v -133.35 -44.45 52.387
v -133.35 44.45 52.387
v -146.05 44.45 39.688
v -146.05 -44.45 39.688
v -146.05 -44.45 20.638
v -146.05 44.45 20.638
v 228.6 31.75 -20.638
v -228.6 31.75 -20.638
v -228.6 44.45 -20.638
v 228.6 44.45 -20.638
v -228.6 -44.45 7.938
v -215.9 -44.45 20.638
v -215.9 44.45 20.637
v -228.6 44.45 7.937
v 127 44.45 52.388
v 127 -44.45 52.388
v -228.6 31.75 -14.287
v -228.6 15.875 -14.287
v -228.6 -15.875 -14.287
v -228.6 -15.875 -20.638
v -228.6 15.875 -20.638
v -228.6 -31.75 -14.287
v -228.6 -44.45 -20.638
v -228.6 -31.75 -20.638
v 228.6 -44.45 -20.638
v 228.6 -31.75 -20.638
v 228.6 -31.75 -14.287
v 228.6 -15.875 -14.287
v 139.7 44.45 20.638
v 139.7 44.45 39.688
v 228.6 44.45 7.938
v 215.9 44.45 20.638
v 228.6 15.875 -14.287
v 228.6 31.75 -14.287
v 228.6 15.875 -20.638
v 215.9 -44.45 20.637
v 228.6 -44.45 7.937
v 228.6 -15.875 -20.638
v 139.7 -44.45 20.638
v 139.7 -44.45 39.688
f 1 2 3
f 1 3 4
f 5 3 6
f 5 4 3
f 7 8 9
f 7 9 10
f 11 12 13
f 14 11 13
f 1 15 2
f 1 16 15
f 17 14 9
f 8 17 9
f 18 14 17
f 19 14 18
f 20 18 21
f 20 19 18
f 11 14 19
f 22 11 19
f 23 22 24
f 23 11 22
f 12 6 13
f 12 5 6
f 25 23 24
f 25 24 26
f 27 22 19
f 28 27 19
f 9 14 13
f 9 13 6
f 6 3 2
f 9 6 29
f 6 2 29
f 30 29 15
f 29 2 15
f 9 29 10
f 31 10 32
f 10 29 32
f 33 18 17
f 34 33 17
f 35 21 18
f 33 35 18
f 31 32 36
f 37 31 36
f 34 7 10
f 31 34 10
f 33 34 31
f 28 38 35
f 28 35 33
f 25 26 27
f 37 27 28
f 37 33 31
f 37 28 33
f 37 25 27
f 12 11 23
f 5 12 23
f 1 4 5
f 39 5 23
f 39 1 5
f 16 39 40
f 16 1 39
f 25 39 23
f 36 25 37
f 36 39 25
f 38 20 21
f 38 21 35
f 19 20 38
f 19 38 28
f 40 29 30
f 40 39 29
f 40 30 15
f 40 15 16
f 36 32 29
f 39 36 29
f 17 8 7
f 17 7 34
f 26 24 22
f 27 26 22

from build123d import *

# Parameters (mm, degrees)
F1_DEPTH = 44.45
F2_SIZE  = 12.7
F3_W     = 15.875
F3_H     = 6.35
F4_DEPTH = 241.3


with BuildPart() as f1:
    # F0 (on Front) → F1 (new body, symmetric)
    with BuildSketch(Plane.XZ):
        Polygon((228.6, -20.6375), (228.6, 20.6375), (139.7, 20.6375), (139.7, 52.3875), (-146.05, 52.3875), (-146.05, 20.6375), (-228.6, 20.6375), (-228.6, -20.6375), align=None)
    extrude(amount=F1_DEPTH, both=True)

    # F2
    f2_edges = [f1.edges().sort_by_distance(p)[0] for p in [
        (-146.05, 0, 52.3875),
        (-228.6, 0, 20.6375),
        (139.7, 0, 52.3875),
        (228.6, 0, 20.6375),
    ]]
    chamfer(f2_edges, length=F2_SIZE)

    # F3 (on Right) → F4 (cut, symmetric)
    with BuildSketch(Plane.YZ):
        with Locations((-23.8125, -17.4625)):
            Rectangle(F3_W, F3_H)
        with Locations((23.8125, -17.4625)):
            Rectangle(F3_W, F3_H)
    extrude(amount=F4_DEPTH, both=True, mode=Mode.SUBTRACT)


solid = f1.part
